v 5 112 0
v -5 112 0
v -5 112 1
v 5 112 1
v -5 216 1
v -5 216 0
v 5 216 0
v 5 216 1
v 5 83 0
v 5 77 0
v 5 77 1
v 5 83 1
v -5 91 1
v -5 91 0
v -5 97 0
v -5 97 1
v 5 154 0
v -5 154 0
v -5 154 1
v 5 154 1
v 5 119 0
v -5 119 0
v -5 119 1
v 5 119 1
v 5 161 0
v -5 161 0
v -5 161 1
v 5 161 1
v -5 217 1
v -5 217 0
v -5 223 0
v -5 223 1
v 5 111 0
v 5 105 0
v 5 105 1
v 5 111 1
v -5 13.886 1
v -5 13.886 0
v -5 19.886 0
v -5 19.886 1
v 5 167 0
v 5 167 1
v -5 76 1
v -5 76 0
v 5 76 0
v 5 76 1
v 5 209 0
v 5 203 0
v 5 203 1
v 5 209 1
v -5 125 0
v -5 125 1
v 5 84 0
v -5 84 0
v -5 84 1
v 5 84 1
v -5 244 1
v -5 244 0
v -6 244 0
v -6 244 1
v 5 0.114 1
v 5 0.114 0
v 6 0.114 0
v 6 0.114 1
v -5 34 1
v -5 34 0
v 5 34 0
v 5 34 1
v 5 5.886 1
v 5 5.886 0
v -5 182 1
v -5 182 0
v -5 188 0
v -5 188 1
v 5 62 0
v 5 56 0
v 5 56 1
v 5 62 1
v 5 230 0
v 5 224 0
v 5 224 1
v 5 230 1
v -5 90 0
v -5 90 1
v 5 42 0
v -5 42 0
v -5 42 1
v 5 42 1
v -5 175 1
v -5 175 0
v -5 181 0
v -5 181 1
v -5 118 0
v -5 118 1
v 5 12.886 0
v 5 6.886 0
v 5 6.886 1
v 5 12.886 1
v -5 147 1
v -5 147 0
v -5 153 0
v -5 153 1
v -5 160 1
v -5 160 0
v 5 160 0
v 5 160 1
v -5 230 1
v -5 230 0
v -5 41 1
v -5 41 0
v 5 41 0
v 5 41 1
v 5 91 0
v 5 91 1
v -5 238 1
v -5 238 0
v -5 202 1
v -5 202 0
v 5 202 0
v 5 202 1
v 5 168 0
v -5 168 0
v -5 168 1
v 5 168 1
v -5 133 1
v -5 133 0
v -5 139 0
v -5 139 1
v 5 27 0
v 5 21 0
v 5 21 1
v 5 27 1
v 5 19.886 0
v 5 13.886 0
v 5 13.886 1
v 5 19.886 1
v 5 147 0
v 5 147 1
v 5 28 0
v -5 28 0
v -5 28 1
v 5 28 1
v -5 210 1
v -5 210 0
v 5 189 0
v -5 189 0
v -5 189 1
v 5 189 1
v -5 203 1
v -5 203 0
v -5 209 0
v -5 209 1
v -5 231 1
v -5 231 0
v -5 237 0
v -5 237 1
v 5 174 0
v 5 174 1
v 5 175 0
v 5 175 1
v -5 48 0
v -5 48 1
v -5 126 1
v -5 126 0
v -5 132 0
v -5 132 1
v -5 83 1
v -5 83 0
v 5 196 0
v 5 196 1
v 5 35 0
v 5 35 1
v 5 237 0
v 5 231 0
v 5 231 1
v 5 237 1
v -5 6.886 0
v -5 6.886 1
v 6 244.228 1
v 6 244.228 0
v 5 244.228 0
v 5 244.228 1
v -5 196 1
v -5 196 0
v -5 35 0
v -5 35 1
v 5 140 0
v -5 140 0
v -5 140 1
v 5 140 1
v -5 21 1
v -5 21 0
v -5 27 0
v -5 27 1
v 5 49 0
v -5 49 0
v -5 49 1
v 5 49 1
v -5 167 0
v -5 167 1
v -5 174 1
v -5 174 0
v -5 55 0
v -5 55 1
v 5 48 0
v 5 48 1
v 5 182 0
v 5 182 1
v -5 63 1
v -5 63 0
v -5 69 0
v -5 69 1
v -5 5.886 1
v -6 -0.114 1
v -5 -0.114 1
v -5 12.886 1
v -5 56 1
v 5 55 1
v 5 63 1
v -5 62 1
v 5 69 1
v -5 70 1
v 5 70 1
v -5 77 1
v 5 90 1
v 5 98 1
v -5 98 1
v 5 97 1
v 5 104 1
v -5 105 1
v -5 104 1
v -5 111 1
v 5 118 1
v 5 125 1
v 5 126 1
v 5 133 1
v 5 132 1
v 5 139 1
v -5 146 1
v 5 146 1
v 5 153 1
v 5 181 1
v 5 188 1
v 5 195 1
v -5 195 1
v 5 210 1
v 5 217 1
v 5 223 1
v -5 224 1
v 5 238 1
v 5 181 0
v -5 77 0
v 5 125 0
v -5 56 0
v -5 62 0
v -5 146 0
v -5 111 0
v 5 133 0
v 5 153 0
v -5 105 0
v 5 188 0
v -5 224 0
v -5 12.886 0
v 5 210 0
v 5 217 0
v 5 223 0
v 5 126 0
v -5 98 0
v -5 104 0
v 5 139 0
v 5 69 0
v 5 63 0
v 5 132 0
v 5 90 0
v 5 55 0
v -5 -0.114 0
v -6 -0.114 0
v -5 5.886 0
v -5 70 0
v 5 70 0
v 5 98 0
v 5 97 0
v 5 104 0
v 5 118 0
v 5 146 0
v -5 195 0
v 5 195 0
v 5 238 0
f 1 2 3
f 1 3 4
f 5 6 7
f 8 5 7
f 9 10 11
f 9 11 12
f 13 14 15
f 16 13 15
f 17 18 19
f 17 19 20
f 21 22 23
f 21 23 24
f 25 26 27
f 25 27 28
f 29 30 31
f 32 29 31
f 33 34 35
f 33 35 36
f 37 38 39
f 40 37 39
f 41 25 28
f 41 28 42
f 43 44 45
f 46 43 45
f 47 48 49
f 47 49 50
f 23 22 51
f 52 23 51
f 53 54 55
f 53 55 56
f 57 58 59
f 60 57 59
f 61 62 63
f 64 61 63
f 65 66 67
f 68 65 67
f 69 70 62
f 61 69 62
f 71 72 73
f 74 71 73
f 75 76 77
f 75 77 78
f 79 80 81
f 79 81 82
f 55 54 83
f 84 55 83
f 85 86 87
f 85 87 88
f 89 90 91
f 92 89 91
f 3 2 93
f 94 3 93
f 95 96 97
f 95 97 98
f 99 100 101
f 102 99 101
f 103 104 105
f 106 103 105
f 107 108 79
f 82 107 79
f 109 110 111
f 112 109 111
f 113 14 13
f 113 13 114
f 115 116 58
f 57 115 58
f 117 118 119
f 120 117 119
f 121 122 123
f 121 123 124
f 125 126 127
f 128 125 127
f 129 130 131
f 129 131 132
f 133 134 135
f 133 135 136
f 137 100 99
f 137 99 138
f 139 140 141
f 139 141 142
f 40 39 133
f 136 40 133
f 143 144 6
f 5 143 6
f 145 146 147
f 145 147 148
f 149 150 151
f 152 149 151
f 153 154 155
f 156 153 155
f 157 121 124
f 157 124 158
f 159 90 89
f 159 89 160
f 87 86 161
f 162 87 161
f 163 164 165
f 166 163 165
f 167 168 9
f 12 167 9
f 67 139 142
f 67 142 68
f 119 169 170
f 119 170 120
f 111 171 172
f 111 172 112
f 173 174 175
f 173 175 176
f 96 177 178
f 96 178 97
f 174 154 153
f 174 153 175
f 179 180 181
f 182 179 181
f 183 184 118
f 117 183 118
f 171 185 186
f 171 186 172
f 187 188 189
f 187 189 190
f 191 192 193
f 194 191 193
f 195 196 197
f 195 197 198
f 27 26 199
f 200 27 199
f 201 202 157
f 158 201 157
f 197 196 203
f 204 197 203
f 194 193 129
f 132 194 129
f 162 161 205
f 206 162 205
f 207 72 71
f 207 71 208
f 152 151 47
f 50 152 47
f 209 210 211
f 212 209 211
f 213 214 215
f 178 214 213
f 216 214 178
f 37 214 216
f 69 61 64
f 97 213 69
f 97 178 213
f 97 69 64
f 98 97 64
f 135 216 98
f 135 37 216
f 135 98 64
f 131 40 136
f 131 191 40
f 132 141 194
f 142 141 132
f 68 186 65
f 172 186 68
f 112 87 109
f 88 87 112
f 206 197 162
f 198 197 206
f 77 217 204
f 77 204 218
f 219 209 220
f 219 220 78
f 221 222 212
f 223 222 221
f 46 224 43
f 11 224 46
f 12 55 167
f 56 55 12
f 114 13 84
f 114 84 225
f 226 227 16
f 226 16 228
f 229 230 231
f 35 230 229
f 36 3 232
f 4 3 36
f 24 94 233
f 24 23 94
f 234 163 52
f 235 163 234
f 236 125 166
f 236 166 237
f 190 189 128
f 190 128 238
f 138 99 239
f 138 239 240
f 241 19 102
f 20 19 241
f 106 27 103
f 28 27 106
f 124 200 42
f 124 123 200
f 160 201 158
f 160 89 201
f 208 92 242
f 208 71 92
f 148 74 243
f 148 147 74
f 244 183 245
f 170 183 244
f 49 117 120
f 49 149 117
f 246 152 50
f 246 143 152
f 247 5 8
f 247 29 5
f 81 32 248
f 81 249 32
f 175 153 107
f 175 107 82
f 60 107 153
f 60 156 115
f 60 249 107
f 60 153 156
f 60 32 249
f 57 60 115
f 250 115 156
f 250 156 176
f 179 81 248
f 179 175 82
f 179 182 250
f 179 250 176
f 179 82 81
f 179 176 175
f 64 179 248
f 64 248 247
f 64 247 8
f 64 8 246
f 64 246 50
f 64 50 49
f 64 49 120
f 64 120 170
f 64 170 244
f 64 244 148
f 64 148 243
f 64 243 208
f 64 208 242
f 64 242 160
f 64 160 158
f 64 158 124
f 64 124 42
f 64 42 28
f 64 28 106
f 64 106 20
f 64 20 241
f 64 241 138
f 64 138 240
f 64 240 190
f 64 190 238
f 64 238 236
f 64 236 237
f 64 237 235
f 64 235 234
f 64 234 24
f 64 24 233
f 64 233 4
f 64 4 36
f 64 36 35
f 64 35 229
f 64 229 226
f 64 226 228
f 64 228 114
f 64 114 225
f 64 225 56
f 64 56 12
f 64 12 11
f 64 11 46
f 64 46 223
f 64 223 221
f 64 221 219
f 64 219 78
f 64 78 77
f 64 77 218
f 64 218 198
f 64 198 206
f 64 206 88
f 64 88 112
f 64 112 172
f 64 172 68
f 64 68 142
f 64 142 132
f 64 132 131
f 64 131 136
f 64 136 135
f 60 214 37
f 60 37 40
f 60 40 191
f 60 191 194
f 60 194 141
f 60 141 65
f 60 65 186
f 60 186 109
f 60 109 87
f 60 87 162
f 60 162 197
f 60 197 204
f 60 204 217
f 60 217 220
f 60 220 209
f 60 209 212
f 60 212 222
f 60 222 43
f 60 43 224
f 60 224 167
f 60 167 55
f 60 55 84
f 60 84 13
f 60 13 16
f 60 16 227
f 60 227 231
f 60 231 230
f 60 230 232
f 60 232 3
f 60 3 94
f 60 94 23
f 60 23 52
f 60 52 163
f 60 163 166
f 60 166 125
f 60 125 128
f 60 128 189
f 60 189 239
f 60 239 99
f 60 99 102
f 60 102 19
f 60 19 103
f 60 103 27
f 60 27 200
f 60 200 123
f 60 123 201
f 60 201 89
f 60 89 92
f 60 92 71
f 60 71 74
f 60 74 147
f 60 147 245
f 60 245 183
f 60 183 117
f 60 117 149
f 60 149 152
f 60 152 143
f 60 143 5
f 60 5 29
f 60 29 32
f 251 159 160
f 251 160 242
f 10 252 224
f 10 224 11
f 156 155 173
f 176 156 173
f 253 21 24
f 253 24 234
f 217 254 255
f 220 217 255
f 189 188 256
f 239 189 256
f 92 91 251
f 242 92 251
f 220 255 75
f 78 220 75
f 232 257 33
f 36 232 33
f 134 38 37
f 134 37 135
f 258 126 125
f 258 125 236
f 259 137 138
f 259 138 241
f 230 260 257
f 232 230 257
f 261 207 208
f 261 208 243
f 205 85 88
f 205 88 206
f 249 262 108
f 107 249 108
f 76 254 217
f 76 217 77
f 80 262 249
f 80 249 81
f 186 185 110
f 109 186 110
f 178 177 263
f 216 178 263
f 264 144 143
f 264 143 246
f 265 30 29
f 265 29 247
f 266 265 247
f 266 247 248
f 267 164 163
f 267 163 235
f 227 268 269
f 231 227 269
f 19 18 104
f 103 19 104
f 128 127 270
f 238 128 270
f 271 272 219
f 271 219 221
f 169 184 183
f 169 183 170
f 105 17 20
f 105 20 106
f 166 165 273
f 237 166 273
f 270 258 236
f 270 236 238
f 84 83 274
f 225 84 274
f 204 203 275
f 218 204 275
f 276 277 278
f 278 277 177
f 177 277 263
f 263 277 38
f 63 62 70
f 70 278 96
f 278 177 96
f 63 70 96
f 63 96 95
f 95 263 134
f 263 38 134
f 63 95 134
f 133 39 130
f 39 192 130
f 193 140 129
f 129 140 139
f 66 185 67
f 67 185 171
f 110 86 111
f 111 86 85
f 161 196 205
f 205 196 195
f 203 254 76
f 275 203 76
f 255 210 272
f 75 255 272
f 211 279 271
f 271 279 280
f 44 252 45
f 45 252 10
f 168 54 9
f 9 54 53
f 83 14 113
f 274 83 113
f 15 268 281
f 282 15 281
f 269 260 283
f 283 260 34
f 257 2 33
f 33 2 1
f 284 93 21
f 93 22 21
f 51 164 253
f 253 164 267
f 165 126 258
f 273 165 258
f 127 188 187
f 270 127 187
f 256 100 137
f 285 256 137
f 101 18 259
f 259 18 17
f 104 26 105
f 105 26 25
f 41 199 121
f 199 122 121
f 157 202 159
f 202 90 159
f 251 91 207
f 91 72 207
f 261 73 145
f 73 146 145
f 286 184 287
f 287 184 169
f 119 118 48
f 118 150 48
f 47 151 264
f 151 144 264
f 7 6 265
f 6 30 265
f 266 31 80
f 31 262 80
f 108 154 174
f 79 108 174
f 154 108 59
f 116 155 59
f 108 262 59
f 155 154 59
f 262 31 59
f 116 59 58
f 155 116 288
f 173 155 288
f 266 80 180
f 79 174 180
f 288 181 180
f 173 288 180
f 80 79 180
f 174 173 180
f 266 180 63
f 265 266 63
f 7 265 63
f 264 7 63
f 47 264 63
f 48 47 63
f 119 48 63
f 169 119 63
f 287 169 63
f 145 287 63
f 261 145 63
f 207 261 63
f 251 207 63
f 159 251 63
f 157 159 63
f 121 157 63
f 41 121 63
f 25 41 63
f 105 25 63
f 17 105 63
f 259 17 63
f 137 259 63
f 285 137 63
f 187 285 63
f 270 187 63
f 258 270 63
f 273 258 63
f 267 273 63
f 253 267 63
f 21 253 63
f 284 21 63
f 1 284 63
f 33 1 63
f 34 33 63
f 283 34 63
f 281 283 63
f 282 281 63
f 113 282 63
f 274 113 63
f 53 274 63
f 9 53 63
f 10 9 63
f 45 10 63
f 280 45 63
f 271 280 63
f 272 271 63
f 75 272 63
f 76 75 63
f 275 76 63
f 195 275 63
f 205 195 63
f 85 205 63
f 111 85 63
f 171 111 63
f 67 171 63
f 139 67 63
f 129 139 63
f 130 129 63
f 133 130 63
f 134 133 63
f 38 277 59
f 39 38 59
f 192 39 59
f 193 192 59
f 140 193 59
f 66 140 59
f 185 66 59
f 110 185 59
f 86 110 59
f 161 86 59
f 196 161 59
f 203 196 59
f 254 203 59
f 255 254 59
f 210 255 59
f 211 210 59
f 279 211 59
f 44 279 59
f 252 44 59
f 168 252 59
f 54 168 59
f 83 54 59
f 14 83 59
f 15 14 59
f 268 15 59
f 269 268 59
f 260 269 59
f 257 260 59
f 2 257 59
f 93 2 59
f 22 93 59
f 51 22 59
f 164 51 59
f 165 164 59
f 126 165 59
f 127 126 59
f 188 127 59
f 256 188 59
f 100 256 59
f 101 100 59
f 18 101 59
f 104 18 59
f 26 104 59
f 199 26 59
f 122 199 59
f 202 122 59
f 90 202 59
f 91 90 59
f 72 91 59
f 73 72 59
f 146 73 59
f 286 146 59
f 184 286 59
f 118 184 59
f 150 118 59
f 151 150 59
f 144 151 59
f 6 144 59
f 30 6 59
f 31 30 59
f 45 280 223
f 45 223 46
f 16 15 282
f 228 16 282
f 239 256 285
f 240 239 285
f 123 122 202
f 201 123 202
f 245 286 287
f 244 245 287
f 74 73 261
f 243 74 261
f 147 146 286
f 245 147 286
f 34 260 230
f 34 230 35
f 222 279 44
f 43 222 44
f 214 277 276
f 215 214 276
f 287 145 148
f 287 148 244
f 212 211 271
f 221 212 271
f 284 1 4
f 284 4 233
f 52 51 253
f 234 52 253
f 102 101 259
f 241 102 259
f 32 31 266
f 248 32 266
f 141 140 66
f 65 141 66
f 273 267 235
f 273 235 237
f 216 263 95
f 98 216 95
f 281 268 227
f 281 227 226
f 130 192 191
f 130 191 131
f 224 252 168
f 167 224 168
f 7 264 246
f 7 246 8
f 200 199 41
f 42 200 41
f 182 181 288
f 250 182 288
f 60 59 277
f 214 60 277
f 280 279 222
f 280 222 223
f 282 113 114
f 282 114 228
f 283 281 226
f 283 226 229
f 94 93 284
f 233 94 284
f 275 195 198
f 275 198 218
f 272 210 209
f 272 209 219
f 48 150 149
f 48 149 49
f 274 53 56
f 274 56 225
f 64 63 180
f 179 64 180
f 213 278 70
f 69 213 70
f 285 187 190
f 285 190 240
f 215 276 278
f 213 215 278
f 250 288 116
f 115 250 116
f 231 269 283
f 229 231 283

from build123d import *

# Parameters (mm, degrees)
SKETCH_W  = 10
SKETCH_H  = 6
PAD_DEPTH = 1


with BuildPart() as part:
    # Sketch → Pad (new body)
    with BuildSketch(Plane.XY):
        Polygon((-5, 5.886205), (5, 5.886205), (5, 0.113795), (6, 0.113795), (6, 244.227589), (5, 244.227589), (5, 238), (-5, 238), (-5, 244), (-6, 244), (-6, -0.113795), (-5, -0.113795), align=None)
        with Locations((0, 16.886205)):
            Rectangle(SKETCH_W, SKETCH_H, mode=Mode.SUBTRACT)
        with Locations((0, 24)):
            Rectangle(SKETCH_W, SKETCH_H, mode=Mode.SUBTRACT)
        with Locations((0, 31)):
            Rectangle(SKETCH_W, SKETCH_H, mode=Mode.SUBTRACT)
        with Locations((0, 38)):
            Rectangle(SKETCH_W, SKETCH_H, mode=Mode.SUBTRACT)
        with Locations((0, 45)):
            Rectangle(SKETCH_W, SKETCH_H, mode=Mode.SUBTRACT)
        with Locations((0, 52)):
            Rectangle(SKETCH_W, SKETCH_H, mode=Mode.SUBTRACT)
        with Locations((0, 59)):
            Rectangle(SKETCH_W, SKETCH_H, mode=Mode.SUBTRACT)
        with Locations((0, 66)):
            Rectangle(SKETCH_W, SKETCH_H, mode=Mode.SUBTRACT)
        with Locations((0, 73)):
            Rectangle(SKETCH_W, SKETCH_H, mode=Mode.SUBTRACT)
        with Locations((0, 80)):
            Rectangle(SKETCH_W, SKETCH_H, mode=Mode.SUBTRACT)
        with Locations((0, 87)):
            Rectangle(SKETCH_W, SKETCH_H, mode=Mode.SUBTRACT)
        with Locations((0, 94)):
            Rectangle(SKETCH_W, SKETCH_H, mode=Mode.SUBTRACT)
        with Locations((0, 101)):
            Rectangle(SKETCH_W, SKETCH_H, mode=Mode.SUBTRACT)
        with Locations((0, 108)):
            Rectangle(SKETCH_W, SKETCH_H, mode=Mode.SUBTRACT)
        with Locations((0, 115)):
            Rectangle(SKETCH_W, SKETCH_H, mode=Mode.SUBTRACT)
        with Locations((0, 122)):
            Rectangle(SKETCH_W, SKETCH_H, mode=Mode.SUBTRACT)
        with Locations((0, 129)):
            Rectangle(SKETCH_W, SKETCH_H, mode=Mode.SUBTRACT)
        with Locations((0, 136)):
            Rectangle(SKETCH_W, SKETCH_H, mode=Mode.SUBTRACT)
        with Locations((0, 143)):
            Rectangle(SKETCH_W, SKETCH_H, mode=Mode.SUBTRACT)
        with Locations((0, 150)):
            Rectangle(SKETCH_W, SKETCH_H, mode=Mode.SUBTRACT)
        with Locations((0, 157)):
            Rectangle(SKETCH_W, SKETCH_H, mode=Mode.SUBTRACT)
        with Locations((0, 164)):
            Rectangle(SKETCH_W, SKETCH_H, mode=Mode.SUBTRACT)
        with Locations((0, 171)):
            Rectangle(SKETCH_W, SKETCH_H, mode=Mode.SUBTRACT)
        with Locations((0, 178)):
            Rectangle(SKETCH_W, SKETCH_H, mode=Mode.SUBTRACT)
        with Locations((0, 185)):
            Rectangle(SKETCH_W, SKETCH_H, mode=Mode.SUBTRACT)
        with Locations((0, 192)):
            Rectangle(SKETCH_W, SKETCH_H, mode=Mode.SUBTRACT)
        with Locations((0, 199)):
            Rectangle(SKETCH_W, SKETCH_H, mode=Mode.SUBTRACT)
        with Locations((0, 206)):
            Rectangle(SKETCH_W, SKETCH_H, mode=Mode.SUBTRACT)
        with Locations((0, 213)):
            Rectangle(SKETCH_W, SKETCH_H, mode=Mode.SUBTRACT)
        with Locations((0, 220)):
            Rectangle(SKETCH_W, SKETCH_H, mode=Mode.SUBTRACT)
        with Locations((0, 227)):
            Rectangle(SKETCH_W, SKETCH_H, mode=Mode.SUBTRACT)
        with Locations((0, 234)):
            Rectangle(SKETCH_W, SKETCH_H, mode=Mode.SUBTRACT)
        with Locations((0, 9.886205)):
            Rectangle(SKETCH_W, SKETCH_H, mode=Mode.SUBTRACT)
    extrude(amount=PAD_DEPTH)


solid = part.part
